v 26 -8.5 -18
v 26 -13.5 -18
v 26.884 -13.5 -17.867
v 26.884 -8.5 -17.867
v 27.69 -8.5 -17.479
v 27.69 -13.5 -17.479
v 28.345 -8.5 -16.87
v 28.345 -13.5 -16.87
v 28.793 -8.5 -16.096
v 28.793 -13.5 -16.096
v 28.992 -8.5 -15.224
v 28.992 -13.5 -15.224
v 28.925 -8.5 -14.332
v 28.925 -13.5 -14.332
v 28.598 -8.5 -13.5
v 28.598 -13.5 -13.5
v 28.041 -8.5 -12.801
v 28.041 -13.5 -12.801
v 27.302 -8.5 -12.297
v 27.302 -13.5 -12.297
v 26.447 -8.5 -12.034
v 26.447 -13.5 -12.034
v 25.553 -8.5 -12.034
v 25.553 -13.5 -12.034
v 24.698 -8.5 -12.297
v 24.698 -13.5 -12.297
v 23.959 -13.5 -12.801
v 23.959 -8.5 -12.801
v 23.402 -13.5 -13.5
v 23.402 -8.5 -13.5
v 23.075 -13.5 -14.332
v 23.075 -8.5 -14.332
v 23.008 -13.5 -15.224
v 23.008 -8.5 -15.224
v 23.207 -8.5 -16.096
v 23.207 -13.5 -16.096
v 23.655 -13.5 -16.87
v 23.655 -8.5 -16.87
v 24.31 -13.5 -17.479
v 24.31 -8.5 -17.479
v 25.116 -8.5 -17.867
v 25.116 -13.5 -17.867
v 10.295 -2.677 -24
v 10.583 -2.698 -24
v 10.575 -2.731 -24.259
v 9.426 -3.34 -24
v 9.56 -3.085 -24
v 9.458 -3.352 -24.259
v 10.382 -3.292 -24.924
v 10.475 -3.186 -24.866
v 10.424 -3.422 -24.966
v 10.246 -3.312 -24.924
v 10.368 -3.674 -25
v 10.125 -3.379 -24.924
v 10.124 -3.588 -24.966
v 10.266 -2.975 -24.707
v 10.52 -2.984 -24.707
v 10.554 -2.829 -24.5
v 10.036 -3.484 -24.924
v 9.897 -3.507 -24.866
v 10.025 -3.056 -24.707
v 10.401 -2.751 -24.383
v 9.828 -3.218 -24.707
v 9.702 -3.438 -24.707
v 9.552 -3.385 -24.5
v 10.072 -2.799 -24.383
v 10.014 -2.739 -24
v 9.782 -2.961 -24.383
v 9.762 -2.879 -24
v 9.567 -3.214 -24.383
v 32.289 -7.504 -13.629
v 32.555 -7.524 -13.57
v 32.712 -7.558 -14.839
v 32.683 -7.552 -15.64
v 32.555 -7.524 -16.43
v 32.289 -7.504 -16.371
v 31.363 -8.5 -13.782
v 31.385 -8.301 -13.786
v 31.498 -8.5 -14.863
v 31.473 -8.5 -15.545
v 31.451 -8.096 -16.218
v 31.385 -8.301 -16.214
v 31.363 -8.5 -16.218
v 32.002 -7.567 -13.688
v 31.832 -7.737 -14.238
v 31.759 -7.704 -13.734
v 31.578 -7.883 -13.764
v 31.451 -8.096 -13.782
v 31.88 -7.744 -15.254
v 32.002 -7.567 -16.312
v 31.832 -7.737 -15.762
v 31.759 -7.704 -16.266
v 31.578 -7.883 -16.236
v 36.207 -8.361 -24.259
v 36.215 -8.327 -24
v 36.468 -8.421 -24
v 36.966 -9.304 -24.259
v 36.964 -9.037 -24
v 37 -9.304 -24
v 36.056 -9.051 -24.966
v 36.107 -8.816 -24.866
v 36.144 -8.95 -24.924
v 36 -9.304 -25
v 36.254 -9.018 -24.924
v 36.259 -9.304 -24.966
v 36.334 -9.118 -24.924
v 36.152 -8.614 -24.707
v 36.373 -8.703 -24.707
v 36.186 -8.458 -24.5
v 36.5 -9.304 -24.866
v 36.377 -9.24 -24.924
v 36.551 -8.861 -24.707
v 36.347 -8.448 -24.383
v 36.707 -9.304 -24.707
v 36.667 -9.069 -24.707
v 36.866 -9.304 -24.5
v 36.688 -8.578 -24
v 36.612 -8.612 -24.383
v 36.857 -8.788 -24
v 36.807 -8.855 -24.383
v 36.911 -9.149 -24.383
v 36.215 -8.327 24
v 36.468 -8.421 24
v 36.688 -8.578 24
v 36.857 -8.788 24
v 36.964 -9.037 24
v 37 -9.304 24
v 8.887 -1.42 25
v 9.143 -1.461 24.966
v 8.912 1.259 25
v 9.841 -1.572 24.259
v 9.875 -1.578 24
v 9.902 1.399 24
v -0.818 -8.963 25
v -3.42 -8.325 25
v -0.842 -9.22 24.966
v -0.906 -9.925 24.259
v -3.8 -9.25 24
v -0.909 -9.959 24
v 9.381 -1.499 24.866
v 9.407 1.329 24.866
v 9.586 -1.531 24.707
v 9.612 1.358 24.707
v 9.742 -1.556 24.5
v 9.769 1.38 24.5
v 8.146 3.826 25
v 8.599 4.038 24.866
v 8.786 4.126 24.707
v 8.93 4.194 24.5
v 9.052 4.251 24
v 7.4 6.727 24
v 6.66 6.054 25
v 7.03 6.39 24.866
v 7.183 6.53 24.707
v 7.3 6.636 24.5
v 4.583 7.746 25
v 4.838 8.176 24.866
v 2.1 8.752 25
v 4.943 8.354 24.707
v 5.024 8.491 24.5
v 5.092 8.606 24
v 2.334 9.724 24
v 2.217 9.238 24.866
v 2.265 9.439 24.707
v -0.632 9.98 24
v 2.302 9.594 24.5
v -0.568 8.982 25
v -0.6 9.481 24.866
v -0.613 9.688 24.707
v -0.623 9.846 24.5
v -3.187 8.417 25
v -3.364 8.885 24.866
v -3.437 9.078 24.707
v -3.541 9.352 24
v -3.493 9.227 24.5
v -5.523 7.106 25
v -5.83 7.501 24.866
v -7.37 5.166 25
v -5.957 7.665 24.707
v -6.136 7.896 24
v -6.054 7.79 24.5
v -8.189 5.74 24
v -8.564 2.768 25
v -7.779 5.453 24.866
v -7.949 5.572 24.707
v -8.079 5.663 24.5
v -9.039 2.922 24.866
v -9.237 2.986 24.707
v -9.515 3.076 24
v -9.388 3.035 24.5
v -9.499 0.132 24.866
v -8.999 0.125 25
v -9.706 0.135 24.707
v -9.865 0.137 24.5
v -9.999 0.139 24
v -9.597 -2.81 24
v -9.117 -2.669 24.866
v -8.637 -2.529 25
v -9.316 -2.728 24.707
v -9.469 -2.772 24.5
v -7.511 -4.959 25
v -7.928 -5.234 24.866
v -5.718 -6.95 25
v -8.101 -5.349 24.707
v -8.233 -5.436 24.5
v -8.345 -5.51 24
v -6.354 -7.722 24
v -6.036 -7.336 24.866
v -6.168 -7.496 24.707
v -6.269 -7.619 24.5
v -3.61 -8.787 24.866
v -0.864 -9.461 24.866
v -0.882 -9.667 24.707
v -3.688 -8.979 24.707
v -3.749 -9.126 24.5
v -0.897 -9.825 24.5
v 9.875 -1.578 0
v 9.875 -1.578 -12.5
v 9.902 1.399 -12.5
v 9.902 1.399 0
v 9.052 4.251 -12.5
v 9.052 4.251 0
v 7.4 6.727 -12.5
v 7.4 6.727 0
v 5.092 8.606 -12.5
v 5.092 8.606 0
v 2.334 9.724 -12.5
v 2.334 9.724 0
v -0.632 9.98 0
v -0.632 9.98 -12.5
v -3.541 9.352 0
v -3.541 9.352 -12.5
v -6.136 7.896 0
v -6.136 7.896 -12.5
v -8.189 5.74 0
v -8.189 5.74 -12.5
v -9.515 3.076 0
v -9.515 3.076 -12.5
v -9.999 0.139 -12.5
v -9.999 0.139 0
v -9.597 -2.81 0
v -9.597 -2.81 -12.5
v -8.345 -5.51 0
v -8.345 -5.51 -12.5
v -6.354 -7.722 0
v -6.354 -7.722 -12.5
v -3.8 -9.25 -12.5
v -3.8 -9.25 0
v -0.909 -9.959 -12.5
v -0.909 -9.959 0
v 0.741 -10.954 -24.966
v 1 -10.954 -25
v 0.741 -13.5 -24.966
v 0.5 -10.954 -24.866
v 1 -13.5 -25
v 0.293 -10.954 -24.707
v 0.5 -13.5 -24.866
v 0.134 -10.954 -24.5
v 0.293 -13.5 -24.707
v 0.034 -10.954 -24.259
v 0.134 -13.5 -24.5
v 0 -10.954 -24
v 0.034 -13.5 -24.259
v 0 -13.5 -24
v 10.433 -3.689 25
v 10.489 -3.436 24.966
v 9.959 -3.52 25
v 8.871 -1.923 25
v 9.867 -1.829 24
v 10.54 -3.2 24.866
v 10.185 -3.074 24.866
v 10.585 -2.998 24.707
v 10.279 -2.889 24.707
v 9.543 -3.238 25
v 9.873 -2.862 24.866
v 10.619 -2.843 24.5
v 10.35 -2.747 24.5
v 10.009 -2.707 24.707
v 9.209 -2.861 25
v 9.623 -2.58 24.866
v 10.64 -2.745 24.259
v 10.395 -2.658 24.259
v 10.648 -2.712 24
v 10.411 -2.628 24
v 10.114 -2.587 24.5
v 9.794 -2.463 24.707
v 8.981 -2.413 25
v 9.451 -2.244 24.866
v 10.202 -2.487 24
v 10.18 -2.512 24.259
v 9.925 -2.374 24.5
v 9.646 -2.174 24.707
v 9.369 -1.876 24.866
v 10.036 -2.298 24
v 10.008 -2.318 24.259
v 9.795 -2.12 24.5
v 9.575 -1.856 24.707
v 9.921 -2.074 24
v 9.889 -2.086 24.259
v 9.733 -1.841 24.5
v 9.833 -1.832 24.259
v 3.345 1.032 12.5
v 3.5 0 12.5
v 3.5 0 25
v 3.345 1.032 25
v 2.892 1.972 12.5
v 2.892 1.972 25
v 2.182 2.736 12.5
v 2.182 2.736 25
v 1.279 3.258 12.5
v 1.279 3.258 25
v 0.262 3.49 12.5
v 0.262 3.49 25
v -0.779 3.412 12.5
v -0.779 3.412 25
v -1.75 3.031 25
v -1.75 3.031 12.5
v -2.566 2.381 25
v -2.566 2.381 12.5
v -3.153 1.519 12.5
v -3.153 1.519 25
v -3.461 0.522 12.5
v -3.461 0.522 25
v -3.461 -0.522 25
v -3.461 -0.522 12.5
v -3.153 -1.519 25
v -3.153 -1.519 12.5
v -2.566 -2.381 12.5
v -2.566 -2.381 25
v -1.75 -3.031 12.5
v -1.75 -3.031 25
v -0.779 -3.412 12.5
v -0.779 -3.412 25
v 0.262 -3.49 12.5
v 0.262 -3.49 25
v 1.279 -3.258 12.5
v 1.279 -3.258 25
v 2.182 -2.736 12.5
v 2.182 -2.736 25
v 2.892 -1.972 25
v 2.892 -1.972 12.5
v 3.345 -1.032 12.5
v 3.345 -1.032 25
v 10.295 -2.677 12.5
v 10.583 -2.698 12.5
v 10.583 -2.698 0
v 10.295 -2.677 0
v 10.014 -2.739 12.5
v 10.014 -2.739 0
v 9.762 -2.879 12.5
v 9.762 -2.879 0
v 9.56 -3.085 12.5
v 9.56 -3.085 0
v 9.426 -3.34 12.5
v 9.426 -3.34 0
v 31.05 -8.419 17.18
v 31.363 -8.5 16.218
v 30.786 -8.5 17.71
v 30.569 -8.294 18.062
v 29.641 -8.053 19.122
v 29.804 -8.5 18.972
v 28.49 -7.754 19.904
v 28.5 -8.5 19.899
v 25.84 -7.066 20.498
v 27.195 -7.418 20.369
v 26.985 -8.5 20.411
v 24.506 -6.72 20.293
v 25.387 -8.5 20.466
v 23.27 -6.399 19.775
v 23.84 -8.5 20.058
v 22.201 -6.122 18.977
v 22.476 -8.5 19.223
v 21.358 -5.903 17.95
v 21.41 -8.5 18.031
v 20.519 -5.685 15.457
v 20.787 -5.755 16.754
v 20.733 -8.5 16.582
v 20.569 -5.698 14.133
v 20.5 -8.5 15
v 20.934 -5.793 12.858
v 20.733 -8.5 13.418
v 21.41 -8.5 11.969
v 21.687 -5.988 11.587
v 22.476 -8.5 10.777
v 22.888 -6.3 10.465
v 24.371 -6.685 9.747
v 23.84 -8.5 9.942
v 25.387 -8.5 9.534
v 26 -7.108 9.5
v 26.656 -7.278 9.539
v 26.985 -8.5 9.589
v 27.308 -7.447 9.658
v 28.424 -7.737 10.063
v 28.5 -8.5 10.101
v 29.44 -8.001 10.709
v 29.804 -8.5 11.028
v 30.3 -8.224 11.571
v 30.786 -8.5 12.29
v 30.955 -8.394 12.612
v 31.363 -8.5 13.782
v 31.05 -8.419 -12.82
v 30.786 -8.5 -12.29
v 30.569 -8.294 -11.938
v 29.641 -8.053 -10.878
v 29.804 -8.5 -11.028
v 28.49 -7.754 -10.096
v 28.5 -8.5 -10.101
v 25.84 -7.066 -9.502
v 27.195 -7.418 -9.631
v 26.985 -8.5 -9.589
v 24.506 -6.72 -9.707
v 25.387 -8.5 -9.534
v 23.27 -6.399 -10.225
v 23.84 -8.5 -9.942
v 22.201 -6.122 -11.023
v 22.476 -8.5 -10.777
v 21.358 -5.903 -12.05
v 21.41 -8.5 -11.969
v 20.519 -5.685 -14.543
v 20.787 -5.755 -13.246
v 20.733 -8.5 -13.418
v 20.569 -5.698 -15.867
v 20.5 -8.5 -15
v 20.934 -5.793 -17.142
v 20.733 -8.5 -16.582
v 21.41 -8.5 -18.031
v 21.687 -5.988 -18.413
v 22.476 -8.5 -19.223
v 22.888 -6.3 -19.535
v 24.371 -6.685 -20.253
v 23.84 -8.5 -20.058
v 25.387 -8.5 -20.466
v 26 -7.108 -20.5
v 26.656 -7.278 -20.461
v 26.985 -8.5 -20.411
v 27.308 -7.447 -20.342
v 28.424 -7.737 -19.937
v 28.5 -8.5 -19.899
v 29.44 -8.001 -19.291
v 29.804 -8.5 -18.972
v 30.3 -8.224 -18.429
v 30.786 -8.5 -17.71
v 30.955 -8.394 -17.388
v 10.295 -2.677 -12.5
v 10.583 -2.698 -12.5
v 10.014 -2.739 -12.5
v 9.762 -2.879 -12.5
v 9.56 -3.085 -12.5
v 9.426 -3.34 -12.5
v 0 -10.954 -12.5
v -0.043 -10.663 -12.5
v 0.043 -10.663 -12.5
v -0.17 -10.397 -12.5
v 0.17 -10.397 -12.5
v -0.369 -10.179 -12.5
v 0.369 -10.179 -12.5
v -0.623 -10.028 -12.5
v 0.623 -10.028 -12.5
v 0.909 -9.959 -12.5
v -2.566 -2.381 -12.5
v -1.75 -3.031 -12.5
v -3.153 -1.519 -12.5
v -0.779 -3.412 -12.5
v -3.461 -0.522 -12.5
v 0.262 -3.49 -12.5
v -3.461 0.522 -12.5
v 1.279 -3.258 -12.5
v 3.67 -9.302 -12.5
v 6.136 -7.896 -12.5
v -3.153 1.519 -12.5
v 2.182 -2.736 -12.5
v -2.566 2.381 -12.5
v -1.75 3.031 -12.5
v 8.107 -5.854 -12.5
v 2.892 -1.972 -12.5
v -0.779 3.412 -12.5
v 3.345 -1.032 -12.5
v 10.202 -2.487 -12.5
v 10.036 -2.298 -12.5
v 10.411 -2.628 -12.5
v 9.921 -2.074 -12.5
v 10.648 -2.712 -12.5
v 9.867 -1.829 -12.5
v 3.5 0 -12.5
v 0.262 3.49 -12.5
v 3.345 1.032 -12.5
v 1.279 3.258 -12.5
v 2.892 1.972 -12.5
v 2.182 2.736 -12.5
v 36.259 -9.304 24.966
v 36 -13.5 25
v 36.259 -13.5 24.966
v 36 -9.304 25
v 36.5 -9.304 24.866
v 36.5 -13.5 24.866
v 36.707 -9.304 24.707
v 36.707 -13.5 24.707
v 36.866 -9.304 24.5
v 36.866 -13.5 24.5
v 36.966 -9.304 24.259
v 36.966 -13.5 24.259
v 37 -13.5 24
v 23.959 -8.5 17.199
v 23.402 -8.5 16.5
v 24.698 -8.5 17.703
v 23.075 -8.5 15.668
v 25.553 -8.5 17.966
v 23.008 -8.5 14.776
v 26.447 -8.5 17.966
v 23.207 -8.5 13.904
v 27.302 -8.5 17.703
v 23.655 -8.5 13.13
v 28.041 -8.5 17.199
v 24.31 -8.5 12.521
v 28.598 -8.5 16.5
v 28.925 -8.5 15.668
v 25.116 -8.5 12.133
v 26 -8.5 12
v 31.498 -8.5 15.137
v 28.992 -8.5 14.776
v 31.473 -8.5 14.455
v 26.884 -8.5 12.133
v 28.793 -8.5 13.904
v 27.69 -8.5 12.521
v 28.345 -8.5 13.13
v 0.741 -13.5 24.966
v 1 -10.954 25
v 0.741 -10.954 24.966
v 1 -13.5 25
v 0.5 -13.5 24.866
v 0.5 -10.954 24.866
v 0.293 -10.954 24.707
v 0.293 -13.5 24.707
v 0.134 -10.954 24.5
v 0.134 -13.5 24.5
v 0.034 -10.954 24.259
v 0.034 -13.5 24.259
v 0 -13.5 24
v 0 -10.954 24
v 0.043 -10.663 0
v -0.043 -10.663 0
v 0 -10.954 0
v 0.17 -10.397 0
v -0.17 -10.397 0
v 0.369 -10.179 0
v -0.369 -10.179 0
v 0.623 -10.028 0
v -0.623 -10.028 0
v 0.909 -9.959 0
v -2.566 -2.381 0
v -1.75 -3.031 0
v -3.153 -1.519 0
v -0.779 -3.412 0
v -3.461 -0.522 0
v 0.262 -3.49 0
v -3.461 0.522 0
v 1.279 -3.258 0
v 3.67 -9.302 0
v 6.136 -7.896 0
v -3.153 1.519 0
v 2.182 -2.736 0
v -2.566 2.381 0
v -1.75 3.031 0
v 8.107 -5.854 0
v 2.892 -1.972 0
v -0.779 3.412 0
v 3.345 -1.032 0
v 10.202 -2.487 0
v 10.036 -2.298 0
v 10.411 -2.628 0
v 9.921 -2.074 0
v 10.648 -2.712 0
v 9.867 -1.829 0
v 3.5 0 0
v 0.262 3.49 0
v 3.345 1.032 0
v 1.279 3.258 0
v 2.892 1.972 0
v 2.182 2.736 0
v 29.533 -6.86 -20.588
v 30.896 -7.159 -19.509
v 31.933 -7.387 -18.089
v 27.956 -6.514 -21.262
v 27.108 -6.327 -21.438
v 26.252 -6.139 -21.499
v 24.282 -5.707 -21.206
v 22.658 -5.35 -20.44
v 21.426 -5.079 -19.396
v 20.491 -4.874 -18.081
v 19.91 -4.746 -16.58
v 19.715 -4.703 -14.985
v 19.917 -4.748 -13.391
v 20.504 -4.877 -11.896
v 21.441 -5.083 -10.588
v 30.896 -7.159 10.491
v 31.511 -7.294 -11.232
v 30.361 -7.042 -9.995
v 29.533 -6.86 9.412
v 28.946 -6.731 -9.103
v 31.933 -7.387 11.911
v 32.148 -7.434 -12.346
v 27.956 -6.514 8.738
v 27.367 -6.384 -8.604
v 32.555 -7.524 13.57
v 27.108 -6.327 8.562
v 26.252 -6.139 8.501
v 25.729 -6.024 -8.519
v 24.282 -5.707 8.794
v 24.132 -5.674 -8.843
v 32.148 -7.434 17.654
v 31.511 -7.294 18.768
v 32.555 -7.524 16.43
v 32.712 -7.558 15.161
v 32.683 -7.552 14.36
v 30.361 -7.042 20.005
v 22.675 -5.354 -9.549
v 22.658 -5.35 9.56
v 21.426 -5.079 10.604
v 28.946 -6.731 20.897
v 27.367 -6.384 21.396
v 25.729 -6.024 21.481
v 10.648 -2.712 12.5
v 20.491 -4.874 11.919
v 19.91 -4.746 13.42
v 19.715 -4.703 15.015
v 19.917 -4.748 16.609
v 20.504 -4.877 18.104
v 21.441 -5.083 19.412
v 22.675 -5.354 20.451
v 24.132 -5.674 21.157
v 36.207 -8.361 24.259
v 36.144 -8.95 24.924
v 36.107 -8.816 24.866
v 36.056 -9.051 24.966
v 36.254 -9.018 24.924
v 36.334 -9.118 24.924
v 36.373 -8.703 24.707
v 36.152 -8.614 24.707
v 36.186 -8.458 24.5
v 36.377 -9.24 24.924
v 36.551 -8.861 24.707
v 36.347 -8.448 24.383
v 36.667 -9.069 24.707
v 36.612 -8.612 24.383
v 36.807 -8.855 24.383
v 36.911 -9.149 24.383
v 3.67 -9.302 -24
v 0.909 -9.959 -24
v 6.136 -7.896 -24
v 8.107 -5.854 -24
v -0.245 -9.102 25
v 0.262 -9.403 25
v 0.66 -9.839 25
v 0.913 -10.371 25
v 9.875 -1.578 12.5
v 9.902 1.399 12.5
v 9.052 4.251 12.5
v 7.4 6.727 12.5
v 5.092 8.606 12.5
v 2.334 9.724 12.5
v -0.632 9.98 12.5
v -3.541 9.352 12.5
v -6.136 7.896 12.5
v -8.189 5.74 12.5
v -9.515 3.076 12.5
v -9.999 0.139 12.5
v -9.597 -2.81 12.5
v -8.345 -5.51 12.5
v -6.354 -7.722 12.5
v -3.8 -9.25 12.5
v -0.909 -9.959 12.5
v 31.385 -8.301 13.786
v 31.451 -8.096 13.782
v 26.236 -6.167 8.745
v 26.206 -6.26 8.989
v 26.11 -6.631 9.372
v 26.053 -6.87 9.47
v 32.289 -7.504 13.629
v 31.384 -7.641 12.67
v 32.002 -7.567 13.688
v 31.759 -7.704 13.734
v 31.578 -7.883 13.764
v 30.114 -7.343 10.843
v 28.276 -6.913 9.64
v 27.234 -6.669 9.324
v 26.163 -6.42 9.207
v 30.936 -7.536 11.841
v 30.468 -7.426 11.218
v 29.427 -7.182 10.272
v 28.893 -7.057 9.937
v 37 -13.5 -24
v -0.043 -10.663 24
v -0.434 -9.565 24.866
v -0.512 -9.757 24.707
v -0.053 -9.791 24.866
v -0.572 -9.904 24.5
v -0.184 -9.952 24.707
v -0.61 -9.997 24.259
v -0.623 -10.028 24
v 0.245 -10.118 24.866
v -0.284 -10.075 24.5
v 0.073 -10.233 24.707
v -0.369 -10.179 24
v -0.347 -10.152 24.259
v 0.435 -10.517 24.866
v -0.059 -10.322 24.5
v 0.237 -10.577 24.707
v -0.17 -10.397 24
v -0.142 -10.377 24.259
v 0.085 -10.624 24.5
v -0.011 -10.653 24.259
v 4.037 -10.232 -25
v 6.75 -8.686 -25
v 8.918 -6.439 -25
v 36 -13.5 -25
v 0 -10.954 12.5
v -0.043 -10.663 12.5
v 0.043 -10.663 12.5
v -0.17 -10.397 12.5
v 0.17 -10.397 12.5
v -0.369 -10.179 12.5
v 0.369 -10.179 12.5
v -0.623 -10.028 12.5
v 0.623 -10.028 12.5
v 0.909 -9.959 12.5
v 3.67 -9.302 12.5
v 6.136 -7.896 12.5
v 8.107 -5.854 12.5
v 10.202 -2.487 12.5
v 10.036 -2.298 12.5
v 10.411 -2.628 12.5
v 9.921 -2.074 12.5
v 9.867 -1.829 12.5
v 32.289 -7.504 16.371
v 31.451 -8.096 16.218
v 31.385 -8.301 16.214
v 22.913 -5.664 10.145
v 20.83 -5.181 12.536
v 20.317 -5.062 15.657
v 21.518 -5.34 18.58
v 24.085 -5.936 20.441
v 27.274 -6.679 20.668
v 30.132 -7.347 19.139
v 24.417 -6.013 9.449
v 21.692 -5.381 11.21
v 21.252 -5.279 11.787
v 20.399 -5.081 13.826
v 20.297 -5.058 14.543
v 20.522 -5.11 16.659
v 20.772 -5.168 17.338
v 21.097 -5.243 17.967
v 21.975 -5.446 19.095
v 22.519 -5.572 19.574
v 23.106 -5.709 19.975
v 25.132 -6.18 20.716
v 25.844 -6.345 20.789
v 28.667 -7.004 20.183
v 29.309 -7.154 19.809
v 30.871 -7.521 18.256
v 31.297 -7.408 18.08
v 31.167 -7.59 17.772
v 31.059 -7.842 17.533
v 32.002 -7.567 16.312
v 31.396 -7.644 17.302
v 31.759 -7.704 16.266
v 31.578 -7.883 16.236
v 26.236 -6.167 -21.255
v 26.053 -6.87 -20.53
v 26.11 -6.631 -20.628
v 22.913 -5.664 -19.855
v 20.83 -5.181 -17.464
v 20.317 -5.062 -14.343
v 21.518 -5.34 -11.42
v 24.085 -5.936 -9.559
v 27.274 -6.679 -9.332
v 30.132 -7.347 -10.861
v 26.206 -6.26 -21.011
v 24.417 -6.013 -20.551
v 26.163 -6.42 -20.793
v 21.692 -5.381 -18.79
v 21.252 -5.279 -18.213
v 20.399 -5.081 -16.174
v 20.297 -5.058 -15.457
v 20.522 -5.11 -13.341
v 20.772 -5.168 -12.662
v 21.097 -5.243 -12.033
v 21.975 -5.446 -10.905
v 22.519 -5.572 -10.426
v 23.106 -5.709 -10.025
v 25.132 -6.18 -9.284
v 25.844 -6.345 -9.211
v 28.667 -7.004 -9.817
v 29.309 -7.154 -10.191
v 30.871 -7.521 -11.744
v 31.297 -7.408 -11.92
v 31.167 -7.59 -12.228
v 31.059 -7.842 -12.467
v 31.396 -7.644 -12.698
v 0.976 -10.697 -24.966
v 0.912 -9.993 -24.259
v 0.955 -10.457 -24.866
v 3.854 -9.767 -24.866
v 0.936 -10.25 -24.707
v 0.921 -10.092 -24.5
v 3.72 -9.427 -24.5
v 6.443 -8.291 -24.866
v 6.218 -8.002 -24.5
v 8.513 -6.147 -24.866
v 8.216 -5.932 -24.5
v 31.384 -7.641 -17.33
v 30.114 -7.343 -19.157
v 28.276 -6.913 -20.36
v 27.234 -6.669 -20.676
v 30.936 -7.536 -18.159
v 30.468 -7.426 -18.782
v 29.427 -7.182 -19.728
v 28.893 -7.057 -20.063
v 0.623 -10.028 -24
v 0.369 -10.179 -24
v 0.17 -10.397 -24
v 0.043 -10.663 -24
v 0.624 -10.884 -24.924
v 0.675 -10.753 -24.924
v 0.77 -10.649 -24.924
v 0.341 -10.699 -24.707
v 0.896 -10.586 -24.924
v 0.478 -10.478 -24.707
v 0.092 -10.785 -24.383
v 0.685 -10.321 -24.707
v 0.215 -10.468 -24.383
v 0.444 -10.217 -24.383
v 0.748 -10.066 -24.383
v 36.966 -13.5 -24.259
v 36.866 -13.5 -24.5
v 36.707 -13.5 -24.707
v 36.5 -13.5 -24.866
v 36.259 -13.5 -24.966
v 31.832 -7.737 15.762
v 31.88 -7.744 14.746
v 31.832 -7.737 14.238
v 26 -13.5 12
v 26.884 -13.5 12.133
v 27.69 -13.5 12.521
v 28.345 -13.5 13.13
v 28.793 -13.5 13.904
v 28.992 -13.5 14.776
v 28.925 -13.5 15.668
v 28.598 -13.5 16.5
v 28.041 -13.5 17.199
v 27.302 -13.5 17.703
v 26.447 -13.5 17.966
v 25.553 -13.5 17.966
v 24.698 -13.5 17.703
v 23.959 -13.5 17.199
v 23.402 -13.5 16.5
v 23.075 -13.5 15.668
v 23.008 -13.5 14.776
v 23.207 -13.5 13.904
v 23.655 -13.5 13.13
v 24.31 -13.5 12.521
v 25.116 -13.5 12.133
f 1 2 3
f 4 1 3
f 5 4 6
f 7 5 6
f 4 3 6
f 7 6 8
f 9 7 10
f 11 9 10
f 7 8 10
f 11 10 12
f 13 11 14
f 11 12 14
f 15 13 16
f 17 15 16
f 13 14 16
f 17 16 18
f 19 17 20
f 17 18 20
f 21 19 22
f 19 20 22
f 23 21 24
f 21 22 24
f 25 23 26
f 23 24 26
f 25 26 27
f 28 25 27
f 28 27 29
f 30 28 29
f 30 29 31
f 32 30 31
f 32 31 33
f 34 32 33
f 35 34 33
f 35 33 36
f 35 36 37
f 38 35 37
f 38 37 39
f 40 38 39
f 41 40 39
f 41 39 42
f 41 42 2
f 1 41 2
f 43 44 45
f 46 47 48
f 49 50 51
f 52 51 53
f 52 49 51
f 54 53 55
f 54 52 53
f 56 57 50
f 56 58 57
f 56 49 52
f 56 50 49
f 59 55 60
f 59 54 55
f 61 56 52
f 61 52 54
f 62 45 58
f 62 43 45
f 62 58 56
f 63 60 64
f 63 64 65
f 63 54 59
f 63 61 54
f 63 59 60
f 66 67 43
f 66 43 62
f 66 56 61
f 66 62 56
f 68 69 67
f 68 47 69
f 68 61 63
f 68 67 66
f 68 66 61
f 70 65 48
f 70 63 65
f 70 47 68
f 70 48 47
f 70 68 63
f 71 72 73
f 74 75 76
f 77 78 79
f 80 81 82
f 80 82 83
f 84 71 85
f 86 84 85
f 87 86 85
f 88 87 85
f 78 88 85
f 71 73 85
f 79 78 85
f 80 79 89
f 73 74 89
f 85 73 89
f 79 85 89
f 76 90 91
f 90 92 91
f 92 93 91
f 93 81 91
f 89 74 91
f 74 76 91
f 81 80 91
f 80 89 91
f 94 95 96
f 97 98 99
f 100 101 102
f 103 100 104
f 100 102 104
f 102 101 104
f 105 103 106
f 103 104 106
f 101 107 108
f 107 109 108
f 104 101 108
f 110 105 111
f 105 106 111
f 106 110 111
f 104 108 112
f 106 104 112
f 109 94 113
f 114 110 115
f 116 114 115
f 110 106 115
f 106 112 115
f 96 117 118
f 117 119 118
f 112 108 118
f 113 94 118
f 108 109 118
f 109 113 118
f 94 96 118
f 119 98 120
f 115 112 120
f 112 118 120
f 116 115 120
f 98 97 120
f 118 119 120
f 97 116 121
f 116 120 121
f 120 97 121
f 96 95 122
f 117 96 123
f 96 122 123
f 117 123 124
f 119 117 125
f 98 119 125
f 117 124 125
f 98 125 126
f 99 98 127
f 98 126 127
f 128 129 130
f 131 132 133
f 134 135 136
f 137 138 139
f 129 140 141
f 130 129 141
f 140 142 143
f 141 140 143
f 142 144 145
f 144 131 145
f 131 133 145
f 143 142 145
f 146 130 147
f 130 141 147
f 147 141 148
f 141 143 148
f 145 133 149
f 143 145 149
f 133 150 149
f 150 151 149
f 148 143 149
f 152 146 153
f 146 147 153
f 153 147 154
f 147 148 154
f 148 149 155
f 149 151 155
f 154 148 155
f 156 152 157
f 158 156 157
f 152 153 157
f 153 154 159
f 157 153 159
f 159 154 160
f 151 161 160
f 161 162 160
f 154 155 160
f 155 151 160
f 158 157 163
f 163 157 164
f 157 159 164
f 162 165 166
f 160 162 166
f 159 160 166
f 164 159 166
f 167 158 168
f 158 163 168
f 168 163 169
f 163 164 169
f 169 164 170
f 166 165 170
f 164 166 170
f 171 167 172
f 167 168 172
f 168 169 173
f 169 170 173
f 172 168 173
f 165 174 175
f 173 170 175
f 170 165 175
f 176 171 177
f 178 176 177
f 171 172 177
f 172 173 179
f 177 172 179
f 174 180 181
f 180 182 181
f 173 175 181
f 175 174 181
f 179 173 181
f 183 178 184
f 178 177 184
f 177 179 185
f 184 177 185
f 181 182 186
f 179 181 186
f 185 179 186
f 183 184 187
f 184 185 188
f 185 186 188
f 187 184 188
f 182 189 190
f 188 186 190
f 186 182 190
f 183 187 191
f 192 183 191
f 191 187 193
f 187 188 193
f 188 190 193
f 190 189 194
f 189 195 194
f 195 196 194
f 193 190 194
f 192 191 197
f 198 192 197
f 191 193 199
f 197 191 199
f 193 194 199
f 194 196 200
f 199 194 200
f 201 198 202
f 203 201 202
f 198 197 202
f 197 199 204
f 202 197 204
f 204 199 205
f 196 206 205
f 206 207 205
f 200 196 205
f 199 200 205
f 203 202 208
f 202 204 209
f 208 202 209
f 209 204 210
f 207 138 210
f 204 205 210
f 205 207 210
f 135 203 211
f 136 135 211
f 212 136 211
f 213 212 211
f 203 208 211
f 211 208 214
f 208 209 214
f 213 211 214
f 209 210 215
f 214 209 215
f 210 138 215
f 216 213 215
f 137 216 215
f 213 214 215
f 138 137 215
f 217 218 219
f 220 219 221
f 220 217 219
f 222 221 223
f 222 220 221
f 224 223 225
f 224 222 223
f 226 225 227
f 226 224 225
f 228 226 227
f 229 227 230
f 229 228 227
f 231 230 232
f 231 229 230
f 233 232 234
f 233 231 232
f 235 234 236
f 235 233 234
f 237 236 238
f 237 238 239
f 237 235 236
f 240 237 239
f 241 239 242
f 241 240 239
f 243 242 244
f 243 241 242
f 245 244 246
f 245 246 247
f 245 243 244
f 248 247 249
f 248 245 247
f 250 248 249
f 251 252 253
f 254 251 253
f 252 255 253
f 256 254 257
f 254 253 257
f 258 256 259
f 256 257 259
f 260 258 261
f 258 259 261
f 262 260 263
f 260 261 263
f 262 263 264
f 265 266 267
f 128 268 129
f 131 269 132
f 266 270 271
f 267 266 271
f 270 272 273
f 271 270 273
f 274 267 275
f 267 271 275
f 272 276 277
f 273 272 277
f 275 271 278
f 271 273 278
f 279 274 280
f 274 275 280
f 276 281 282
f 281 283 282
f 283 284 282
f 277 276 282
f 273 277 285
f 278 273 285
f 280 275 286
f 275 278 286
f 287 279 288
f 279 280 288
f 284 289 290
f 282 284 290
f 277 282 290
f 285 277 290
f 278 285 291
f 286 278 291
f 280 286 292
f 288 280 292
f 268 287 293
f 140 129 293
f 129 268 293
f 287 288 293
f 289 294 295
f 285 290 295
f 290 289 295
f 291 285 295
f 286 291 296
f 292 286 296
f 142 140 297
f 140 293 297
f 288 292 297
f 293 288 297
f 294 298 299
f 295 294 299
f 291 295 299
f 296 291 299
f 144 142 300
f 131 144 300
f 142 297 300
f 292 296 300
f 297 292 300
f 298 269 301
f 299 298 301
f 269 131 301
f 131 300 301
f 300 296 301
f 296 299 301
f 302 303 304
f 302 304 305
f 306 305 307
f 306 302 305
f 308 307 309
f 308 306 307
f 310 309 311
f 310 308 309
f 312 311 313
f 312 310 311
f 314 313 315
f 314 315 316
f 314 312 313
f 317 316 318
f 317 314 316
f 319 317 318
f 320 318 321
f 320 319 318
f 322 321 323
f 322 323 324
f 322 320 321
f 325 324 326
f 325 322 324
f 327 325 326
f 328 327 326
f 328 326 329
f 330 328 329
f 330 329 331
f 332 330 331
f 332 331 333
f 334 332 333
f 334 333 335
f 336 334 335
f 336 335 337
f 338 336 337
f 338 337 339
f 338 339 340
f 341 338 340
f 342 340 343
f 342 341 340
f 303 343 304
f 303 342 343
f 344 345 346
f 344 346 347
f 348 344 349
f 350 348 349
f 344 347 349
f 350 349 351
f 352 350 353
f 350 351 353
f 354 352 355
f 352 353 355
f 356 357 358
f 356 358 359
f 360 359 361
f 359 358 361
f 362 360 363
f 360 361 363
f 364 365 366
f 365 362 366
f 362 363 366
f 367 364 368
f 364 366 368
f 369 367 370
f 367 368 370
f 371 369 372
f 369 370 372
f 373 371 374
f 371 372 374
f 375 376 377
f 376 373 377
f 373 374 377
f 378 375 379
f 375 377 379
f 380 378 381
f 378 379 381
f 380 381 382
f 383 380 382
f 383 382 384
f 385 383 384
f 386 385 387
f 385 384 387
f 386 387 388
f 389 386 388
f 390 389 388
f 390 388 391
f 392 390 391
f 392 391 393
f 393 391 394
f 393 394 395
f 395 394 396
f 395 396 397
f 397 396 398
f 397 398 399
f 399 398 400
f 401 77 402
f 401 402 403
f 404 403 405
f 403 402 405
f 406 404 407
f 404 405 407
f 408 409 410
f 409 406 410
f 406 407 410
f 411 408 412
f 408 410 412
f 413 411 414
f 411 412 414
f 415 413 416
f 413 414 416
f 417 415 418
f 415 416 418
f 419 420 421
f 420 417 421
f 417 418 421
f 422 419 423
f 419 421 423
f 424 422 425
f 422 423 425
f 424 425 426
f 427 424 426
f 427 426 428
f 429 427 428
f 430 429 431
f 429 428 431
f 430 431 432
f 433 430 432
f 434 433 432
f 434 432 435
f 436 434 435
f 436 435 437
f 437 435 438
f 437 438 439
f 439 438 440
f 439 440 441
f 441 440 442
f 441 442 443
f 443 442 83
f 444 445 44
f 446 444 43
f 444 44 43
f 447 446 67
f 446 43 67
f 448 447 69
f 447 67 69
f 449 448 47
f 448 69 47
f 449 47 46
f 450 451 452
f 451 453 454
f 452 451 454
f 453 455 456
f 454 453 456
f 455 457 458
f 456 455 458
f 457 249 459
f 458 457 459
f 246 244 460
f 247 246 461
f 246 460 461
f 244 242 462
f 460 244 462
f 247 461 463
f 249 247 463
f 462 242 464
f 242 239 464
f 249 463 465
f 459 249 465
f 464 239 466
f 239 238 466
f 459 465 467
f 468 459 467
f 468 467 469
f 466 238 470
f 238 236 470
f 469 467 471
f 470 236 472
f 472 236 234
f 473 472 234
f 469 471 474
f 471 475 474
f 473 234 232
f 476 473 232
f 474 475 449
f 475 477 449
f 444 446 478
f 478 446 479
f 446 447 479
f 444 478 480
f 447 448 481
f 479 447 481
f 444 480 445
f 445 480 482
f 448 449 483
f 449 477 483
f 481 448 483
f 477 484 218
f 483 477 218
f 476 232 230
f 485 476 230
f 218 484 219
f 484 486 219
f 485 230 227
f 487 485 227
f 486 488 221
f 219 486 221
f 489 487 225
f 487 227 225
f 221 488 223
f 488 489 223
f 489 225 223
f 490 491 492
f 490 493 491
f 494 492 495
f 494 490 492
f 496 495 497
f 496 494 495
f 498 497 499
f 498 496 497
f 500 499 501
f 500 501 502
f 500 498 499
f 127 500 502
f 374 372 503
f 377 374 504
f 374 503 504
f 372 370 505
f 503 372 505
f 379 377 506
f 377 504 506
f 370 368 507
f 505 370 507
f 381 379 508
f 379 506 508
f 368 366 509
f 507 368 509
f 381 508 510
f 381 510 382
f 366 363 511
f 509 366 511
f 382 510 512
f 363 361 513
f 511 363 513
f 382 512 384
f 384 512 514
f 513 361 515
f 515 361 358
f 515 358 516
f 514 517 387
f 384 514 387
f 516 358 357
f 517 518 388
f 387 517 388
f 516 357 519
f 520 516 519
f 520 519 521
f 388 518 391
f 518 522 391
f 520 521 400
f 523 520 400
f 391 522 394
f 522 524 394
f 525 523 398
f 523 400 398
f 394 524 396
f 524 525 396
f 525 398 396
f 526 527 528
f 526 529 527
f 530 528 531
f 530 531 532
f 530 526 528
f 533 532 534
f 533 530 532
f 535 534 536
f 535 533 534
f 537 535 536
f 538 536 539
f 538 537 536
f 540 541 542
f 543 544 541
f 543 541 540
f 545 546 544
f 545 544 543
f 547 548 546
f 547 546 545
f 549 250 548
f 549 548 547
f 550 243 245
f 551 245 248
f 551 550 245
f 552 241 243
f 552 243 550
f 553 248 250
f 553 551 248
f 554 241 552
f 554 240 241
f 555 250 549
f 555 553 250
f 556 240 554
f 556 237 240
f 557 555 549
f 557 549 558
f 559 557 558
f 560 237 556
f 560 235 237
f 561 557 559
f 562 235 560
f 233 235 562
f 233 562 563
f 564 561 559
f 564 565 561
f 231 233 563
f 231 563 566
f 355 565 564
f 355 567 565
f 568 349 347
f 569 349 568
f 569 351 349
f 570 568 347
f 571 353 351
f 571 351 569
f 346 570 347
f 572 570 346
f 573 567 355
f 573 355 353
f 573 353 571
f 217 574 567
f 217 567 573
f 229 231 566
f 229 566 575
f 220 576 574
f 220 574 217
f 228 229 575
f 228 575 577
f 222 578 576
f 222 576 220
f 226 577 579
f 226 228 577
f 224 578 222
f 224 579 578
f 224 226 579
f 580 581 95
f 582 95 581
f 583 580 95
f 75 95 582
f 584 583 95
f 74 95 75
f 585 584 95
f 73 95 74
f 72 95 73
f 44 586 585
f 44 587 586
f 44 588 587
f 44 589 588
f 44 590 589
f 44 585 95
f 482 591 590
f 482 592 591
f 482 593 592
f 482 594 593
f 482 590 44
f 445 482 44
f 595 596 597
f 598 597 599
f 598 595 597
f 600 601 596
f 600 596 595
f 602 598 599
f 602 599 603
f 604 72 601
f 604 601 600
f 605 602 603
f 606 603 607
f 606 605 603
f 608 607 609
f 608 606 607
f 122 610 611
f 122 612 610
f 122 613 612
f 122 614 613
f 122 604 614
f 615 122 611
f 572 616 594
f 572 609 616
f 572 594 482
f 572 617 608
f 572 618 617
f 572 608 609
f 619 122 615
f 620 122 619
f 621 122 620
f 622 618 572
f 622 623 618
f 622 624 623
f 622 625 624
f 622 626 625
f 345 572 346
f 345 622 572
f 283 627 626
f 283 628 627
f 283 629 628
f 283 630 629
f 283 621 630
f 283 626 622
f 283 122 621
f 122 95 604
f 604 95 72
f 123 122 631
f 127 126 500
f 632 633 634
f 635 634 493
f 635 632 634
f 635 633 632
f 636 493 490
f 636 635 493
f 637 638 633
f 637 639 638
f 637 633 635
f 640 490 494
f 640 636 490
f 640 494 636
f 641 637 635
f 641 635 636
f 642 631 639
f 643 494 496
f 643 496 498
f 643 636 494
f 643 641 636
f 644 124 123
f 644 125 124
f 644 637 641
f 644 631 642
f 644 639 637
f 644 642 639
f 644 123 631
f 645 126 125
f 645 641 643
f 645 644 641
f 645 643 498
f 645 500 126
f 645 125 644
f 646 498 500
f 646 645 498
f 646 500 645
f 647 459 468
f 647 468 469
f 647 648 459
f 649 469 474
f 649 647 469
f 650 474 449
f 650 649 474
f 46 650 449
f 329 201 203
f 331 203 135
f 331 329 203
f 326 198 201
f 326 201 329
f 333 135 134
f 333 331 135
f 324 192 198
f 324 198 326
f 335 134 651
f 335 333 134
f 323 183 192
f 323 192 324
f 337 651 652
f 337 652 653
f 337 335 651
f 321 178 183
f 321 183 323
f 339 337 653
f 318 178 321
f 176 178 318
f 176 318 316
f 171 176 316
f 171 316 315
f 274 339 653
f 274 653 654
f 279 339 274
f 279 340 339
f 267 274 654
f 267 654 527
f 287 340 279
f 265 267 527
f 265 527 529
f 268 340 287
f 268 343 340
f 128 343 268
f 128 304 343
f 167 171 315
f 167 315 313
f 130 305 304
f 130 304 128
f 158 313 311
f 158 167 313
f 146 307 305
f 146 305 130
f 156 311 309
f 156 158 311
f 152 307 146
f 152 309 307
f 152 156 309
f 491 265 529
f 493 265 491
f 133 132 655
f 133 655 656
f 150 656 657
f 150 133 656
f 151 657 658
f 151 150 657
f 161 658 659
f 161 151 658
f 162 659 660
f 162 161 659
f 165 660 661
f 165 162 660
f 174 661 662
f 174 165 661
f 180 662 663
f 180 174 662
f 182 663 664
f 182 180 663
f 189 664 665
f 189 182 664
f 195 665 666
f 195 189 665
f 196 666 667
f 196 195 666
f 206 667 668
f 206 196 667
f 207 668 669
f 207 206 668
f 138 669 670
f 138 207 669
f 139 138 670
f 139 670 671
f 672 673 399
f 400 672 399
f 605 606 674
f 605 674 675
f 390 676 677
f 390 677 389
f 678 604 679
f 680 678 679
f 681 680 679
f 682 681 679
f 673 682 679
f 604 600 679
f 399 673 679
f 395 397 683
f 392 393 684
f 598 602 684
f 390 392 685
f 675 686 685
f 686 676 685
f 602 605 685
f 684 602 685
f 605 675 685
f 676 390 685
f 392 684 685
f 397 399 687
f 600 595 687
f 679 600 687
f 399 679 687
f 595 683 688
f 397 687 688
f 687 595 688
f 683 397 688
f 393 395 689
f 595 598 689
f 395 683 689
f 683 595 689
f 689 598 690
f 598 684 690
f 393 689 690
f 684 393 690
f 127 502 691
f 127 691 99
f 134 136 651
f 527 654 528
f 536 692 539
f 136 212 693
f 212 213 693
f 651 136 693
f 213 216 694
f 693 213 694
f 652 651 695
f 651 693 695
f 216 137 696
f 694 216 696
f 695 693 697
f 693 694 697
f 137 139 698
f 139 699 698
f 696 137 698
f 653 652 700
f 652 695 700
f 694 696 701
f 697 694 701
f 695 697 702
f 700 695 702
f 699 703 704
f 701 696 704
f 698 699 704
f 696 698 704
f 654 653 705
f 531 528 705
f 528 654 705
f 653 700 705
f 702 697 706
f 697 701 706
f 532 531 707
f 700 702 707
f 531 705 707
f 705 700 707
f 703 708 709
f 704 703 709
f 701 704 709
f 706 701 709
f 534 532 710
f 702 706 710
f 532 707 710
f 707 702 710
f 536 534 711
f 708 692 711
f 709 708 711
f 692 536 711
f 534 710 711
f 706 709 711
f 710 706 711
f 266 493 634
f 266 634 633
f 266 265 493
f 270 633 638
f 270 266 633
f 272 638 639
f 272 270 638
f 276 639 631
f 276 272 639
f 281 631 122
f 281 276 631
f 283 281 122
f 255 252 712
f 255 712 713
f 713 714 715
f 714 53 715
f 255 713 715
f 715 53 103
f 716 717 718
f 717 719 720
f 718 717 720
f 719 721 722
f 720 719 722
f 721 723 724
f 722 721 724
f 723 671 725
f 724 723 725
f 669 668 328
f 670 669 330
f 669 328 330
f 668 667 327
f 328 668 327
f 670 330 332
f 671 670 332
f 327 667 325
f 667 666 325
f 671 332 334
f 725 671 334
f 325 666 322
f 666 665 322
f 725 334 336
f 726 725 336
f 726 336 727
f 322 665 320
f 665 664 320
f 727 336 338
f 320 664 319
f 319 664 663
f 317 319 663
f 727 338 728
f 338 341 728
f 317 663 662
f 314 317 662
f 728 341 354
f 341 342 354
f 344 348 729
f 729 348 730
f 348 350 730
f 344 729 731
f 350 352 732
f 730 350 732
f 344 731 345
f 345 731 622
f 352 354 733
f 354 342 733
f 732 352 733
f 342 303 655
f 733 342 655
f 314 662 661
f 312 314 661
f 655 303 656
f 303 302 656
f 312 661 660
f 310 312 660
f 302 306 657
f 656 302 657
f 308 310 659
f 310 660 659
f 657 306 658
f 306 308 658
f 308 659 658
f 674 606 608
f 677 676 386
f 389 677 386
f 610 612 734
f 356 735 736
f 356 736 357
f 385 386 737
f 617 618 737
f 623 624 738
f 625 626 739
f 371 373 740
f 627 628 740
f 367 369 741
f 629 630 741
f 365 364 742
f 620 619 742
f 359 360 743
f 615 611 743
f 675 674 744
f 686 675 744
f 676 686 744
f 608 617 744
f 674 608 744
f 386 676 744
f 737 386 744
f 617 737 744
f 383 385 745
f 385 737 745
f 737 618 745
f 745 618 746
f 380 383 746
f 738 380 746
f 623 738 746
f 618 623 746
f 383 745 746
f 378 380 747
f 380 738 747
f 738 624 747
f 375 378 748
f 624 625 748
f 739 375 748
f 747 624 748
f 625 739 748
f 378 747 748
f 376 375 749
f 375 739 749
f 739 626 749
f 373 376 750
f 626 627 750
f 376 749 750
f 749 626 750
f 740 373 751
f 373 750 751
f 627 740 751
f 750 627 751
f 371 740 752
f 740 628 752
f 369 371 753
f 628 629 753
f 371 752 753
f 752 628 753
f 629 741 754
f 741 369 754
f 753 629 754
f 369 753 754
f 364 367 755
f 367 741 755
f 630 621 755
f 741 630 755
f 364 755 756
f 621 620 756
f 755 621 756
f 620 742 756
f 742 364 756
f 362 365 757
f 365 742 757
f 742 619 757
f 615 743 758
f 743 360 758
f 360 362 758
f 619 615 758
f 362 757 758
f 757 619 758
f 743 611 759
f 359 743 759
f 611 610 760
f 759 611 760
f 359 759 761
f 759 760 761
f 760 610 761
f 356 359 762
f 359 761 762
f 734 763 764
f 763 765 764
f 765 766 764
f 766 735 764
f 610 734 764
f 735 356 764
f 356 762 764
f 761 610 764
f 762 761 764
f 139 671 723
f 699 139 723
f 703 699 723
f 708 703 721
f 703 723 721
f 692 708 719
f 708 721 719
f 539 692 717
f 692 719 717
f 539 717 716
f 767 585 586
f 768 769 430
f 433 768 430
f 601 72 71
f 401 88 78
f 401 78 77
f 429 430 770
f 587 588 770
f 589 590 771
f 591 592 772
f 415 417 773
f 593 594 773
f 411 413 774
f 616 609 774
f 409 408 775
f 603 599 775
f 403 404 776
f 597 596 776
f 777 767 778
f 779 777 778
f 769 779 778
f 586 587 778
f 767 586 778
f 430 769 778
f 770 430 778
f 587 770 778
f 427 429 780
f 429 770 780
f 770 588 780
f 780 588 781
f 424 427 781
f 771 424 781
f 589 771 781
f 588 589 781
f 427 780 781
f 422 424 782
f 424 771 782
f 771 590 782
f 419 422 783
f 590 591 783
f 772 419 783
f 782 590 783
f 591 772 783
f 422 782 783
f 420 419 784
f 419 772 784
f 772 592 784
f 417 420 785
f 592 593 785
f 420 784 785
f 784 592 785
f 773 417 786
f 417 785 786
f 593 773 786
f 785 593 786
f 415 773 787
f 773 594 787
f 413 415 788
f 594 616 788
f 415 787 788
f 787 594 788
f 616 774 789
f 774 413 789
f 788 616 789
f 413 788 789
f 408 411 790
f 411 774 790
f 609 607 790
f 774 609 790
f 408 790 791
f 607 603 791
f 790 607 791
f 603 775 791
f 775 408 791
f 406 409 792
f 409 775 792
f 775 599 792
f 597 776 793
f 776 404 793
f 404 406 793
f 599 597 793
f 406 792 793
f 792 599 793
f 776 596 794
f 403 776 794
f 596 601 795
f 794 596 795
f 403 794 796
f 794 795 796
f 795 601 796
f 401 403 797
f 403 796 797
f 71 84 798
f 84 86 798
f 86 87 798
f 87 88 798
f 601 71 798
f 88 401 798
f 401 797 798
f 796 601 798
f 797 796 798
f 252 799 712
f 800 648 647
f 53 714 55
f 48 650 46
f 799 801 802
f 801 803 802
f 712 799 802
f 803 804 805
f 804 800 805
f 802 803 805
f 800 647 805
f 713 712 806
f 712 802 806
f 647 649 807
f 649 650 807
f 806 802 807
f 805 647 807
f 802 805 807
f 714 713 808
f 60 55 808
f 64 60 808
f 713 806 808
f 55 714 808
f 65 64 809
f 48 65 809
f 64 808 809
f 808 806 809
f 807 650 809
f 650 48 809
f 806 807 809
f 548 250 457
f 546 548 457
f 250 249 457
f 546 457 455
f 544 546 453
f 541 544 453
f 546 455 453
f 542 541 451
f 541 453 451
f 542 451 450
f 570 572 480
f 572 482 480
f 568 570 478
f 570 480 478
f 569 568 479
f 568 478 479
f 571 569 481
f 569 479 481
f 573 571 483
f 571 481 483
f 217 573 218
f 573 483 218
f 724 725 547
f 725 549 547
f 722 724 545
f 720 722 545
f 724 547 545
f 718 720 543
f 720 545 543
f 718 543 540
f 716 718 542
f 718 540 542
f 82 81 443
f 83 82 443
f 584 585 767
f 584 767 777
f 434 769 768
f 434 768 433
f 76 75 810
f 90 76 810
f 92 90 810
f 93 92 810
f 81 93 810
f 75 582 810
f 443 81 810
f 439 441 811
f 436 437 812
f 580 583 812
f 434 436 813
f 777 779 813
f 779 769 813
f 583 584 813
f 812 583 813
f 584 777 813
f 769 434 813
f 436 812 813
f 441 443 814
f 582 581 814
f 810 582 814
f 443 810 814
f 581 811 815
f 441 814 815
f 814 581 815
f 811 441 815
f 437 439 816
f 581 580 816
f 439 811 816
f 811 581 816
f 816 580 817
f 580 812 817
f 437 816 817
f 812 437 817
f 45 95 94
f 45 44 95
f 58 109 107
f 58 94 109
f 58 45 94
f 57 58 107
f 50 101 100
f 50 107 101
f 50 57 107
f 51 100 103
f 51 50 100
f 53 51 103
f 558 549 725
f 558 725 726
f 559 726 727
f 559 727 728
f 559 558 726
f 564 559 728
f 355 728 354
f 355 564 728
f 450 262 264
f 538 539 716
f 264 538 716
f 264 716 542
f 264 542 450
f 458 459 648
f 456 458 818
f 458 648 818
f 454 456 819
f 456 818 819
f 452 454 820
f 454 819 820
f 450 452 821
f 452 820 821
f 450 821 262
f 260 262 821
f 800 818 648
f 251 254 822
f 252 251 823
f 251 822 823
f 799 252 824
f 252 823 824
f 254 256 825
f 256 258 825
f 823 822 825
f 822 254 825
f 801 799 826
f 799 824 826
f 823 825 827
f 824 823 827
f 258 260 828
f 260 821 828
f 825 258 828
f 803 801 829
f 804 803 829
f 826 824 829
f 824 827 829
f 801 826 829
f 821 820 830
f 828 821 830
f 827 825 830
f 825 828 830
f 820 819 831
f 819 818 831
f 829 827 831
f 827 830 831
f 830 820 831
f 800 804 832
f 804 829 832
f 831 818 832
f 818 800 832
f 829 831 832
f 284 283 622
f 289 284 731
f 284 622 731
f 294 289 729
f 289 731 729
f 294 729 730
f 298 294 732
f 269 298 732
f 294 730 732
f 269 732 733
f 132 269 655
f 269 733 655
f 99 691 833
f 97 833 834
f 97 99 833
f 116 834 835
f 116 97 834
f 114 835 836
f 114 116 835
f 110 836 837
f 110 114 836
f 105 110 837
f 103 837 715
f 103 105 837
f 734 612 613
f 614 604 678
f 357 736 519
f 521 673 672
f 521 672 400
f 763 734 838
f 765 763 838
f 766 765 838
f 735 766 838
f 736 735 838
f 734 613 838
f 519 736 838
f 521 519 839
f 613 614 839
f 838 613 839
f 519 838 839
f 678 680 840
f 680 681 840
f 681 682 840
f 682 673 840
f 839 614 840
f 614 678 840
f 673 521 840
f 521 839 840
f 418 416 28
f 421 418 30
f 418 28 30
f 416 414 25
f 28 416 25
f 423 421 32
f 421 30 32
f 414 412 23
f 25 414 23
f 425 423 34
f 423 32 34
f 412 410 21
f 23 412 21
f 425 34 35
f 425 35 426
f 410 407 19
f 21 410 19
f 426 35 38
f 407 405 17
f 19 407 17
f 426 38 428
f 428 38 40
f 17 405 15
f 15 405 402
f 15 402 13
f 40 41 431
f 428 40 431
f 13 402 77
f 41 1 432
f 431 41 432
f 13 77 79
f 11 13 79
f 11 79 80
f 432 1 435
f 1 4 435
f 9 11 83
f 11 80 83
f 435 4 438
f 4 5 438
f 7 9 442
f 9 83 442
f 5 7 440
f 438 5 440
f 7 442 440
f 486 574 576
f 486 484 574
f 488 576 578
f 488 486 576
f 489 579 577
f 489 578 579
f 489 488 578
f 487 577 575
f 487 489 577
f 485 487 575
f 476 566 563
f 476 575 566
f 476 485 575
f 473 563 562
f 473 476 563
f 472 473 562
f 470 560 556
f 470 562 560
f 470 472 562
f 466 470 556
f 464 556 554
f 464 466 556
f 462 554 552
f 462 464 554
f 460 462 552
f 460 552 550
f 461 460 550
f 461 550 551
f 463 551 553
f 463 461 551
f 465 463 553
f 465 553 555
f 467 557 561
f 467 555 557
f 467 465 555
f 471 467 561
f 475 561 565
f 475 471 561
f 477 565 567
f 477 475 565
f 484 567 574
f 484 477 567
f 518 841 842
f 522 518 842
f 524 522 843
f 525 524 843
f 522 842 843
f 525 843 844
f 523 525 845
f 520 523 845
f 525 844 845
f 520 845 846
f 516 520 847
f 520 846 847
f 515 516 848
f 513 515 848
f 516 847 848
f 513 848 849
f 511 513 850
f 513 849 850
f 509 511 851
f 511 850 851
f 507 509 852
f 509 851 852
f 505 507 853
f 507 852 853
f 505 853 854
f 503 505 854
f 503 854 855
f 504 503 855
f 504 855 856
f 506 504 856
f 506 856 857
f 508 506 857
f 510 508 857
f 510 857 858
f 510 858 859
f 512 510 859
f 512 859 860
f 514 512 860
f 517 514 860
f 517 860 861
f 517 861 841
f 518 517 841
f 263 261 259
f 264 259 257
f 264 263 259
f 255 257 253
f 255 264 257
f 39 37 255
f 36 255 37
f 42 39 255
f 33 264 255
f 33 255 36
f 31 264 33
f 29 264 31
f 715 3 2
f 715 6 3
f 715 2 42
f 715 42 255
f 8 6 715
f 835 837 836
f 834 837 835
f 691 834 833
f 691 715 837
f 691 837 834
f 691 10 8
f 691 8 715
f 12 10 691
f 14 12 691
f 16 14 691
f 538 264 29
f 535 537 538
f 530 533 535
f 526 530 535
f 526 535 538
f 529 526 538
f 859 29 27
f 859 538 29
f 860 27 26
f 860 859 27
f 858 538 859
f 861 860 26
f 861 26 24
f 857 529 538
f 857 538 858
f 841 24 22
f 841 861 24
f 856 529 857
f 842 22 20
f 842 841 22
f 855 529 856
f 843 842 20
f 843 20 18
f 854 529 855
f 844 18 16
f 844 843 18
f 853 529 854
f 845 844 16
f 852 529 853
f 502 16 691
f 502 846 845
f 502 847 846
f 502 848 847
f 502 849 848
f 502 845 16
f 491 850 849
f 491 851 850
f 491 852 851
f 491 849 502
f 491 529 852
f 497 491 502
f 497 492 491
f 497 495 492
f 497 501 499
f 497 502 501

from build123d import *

# Parameters (mm, degrees)
SKETCH1_R           = 3.5
BOSS_EXTRUDE1_DEPTH = 25
SKETCH2_R           = 3
CUT_EXTRUDE1_DEPTH  = 51.460380498
SKETCH3_R           = 5.5
CUT_EXTRUDE2_DEPTH  = 49.334770094
SKETCH5_W           = 10
SKETCH5_H           = 12.5
FILLET3_R           = 1
FILLET4_R           = 1


with BuildPart() as part:
    # Sketch1 → Boss-Extrude1 (new, symmetric)
    with BuildSketch(Plane.XY):
        with BuildLine():
            Line((0, -13.5), (37, -13.5))
            Line((37, -13.5), (37, -8.5))
            Line((37, -8.5), (9.682458366, -2.5))
            ThreePointArc((9.682458366, -2.5), (-6.123724357, 7.90569415), (0, -10))
            Line((0, -10), (0, -13.5))
        make_face()
        Circle(SKETCH1_R, mode=Mode.SUBTRACT)
    extrude(amount=BOSS_EXTRUDE1_DEPTH, both=True)

    # Sketch2 → Cut-Extrude1 (cut, through all)
    with BuildSketch(Plane.XZ.offset(13.5)):
        with Locations((26, 15)):
            Circle(SKETCH2_R)
        with Locations((26, -15)):
            Circle(SKETCH2_R)
    extrude(amount=-CUT_EXTRUDE1_DEPTH, mode=Mode.SUBTRACT)

    # Sketch3 → Cut-Extrude2 (cut, through all)
    with BuildSketch(Plane(origin=(0, -8.5, 0), x_dir=(-1, 0, 0), z_dir=(0, -1, 0))):
        with Locations((-26, 15)):
            Circle(SKETCH3_R)
        with Locations((-26, -15)):
            Circle(SKETCH3_R)
    extrude(amount=-CUT_EXTRUDE2_DEPTH, mode=Mode.SUBTRACT)

    # Sketch5 → Cut-Revolve1 (revolve, cut)
    with BuildSketch(Plane(origin=(0, 0, 0), x_dir=(1, 0, 0), z_dir=(0, 1, 0))):
        with Locations((-5, 18.75)):
            Rectangle(SKETCH5_W, SKETCH5_H)
        with Locations((-5, -6.25)):
            Rectangle(SKETCH5_W, SKETCH5_H)
    revolve(axis=Axis((0, 0, -25), (0, 0, 1)), mode=Mode.SUBTRACT)

    # Fillet3
    fillet3_edges = [part.edges().sort_by_distance(p)[0] for p in [
        (0, -10, -6.25),
        (0, -10, 18.75),
        (9.682458366, -2.5, -6.25),
        (9.682458366, -2.5, 18.75),
    ]]
    fillet(fillet3_edges, radius=FILLET3_R)

    # Fillet4
    fillet4_edges = [part.edges().sort_by_distance(p)[0] for p in [
        (0, -12.227225575, 25),
        (-0.261451054, -10.280251288, 25),
        (-6.136482738, 7.895795058, 25),
        (10.03584865, -2.298357368, 25),
        (0, -10, -18.75),
        (0, -11.75, -25),
        (23.341229183, -5.5, -25),
        (6.123724357, -7.90569415, -25),
        (9.682458366, -2.5, -18.75),
        (37, -11, -25),
        (37, -11, 25),
        (37, -8.5, 0),
        (31.5, -7.291985002, -15.00000132),
        (31.5, -7.291985002, 14.99999868),
        (23.823868621, -5.606006487, 25),
        (0, -10, 6.25),
        (9.682458366, -2.5, 6.25),
    ]]
    fillet(fillet4_edges, radius=FILLET4_R)


solid = part.part
